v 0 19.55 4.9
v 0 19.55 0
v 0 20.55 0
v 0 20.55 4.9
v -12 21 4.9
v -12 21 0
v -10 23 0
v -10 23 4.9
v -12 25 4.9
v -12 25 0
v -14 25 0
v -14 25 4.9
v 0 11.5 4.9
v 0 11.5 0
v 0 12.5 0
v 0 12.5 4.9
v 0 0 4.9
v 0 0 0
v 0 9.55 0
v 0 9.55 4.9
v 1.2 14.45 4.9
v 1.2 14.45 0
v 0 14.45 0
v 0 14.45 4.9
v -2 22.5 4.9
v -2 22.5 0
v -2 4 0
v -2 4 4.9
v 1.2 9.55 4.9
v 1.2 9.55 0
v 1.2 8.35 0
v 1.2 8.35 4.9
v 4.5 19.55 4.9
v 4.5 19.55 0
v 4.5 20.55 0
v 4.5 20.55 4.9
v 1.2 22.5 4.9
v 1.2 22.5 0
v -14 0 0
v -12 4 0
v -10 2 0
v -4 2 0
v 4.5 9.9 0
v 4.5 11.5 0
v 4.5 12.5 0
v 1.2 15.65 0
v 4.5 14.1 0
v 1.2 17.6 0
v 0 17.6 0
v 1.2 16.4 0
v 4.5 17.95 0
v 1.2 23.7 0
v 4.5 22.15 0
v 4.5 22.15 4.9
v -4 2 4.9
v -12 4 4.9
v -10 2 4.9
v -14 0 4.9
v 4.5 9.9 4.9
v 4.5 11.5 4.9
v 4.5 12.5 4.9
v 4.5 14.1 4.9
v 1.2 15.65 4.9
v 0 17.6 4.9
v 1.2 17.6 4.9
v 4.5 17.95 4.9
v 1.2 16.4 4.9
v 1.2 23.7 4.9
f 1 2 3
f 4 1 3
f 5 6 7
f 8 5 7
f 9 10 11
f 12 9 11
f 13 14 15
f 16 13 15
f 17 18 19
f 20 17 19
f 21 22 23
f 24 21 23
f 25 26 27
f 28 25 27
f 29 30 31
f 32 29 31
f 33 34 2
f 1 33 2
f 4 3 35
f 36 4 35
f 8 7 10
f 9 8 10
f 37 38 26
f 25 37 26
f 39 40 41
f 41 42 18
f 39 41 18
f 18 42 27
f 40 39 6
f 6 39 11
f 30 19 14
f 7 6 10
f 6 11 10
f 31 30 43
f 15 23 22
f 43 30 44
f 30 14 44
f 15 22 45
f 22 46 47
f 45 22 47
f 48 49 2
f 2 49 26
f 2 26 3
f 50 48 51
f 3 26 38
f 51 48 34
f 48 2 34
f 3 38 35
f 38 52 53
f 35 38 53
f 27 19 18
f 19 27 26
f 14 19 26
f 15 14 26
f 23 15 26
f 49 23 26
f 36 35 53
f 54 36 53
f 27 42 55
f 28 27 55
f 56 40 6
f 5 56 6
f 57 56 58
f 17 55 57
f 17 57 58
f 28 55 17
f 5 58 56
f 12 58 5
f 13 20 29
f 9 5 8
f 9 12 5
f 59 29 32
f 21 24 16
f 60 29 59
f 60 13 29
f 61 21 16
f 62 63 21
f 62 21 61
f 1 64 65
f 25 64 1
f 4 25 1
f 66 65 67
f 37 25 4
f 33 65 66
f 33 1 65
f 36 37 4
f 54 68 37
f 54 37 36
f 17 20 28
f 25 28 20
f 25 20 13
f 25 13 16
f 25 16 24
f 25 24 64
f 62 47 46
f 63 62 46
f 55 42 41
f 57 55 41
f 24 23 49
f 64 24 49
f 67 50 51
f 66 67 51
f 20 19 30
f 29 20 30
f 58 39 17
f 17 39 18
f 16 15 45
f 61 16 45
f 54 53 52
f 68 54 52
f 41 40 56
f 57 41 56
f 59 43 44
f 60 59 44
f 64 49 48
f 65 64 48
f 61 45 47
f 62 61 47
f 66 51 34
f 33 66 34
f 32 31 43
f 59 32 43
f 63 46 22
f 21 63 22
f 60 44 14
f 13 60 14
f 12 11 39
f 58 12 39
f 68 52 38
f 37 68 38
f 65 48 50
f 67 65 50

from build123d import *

# Parameters (mm, degrees)
F1_DEPTH = 4.9
F2_SIZE  = 2
F3_SIZE  = 2


with BuildPart() as f1:
    # F0 (on Top) → F1 (new body)
    with BuildSketch(Plane.XY):
        Polygon((0, 0), (0, 9.55), (1.2, 9.55), (1.2, 8.35), (4.5, 9.9), (4.5, 11.5), (0, 11.5), (0, 12.5), (4.5, 12.5), (4.5, 14.1), (1.2, 15.65), (1.2, 14.45), (0, 14.45), (0, 17.6), (1.2, 17.6), (1.2, 16.4), (4.5, 17.95), (4.5, 19.55), (0, 19.55), (0, 20.55), (4.5, 20.55), (4.5, 22.15), (1.2, 23.7), (1.2, 22.5), (0, 22.5), (-2, 22.5), (-2, 2), (-12, 2), (-12, 21), (-10, 23), (-12, 25), (-14, 25), (-14, 0), align=None)
    extrude(amount=F1_DEPTH)

    # F2
    f2_edges = [f1.edges().sort_by_distance(p)[0] for p in [
        (-2, 2, 2.45),
    ]]
    chamfer(f2_edges, length=F2_SIZE)

    # F3
    f3_edges = [f1.edges().sort_by_distance(p)[0] for p in [
        (-12, 2, 2.45),
    ]]
    chamfer(f3_edges, length=F3_SIZE)


solid = f1.part
